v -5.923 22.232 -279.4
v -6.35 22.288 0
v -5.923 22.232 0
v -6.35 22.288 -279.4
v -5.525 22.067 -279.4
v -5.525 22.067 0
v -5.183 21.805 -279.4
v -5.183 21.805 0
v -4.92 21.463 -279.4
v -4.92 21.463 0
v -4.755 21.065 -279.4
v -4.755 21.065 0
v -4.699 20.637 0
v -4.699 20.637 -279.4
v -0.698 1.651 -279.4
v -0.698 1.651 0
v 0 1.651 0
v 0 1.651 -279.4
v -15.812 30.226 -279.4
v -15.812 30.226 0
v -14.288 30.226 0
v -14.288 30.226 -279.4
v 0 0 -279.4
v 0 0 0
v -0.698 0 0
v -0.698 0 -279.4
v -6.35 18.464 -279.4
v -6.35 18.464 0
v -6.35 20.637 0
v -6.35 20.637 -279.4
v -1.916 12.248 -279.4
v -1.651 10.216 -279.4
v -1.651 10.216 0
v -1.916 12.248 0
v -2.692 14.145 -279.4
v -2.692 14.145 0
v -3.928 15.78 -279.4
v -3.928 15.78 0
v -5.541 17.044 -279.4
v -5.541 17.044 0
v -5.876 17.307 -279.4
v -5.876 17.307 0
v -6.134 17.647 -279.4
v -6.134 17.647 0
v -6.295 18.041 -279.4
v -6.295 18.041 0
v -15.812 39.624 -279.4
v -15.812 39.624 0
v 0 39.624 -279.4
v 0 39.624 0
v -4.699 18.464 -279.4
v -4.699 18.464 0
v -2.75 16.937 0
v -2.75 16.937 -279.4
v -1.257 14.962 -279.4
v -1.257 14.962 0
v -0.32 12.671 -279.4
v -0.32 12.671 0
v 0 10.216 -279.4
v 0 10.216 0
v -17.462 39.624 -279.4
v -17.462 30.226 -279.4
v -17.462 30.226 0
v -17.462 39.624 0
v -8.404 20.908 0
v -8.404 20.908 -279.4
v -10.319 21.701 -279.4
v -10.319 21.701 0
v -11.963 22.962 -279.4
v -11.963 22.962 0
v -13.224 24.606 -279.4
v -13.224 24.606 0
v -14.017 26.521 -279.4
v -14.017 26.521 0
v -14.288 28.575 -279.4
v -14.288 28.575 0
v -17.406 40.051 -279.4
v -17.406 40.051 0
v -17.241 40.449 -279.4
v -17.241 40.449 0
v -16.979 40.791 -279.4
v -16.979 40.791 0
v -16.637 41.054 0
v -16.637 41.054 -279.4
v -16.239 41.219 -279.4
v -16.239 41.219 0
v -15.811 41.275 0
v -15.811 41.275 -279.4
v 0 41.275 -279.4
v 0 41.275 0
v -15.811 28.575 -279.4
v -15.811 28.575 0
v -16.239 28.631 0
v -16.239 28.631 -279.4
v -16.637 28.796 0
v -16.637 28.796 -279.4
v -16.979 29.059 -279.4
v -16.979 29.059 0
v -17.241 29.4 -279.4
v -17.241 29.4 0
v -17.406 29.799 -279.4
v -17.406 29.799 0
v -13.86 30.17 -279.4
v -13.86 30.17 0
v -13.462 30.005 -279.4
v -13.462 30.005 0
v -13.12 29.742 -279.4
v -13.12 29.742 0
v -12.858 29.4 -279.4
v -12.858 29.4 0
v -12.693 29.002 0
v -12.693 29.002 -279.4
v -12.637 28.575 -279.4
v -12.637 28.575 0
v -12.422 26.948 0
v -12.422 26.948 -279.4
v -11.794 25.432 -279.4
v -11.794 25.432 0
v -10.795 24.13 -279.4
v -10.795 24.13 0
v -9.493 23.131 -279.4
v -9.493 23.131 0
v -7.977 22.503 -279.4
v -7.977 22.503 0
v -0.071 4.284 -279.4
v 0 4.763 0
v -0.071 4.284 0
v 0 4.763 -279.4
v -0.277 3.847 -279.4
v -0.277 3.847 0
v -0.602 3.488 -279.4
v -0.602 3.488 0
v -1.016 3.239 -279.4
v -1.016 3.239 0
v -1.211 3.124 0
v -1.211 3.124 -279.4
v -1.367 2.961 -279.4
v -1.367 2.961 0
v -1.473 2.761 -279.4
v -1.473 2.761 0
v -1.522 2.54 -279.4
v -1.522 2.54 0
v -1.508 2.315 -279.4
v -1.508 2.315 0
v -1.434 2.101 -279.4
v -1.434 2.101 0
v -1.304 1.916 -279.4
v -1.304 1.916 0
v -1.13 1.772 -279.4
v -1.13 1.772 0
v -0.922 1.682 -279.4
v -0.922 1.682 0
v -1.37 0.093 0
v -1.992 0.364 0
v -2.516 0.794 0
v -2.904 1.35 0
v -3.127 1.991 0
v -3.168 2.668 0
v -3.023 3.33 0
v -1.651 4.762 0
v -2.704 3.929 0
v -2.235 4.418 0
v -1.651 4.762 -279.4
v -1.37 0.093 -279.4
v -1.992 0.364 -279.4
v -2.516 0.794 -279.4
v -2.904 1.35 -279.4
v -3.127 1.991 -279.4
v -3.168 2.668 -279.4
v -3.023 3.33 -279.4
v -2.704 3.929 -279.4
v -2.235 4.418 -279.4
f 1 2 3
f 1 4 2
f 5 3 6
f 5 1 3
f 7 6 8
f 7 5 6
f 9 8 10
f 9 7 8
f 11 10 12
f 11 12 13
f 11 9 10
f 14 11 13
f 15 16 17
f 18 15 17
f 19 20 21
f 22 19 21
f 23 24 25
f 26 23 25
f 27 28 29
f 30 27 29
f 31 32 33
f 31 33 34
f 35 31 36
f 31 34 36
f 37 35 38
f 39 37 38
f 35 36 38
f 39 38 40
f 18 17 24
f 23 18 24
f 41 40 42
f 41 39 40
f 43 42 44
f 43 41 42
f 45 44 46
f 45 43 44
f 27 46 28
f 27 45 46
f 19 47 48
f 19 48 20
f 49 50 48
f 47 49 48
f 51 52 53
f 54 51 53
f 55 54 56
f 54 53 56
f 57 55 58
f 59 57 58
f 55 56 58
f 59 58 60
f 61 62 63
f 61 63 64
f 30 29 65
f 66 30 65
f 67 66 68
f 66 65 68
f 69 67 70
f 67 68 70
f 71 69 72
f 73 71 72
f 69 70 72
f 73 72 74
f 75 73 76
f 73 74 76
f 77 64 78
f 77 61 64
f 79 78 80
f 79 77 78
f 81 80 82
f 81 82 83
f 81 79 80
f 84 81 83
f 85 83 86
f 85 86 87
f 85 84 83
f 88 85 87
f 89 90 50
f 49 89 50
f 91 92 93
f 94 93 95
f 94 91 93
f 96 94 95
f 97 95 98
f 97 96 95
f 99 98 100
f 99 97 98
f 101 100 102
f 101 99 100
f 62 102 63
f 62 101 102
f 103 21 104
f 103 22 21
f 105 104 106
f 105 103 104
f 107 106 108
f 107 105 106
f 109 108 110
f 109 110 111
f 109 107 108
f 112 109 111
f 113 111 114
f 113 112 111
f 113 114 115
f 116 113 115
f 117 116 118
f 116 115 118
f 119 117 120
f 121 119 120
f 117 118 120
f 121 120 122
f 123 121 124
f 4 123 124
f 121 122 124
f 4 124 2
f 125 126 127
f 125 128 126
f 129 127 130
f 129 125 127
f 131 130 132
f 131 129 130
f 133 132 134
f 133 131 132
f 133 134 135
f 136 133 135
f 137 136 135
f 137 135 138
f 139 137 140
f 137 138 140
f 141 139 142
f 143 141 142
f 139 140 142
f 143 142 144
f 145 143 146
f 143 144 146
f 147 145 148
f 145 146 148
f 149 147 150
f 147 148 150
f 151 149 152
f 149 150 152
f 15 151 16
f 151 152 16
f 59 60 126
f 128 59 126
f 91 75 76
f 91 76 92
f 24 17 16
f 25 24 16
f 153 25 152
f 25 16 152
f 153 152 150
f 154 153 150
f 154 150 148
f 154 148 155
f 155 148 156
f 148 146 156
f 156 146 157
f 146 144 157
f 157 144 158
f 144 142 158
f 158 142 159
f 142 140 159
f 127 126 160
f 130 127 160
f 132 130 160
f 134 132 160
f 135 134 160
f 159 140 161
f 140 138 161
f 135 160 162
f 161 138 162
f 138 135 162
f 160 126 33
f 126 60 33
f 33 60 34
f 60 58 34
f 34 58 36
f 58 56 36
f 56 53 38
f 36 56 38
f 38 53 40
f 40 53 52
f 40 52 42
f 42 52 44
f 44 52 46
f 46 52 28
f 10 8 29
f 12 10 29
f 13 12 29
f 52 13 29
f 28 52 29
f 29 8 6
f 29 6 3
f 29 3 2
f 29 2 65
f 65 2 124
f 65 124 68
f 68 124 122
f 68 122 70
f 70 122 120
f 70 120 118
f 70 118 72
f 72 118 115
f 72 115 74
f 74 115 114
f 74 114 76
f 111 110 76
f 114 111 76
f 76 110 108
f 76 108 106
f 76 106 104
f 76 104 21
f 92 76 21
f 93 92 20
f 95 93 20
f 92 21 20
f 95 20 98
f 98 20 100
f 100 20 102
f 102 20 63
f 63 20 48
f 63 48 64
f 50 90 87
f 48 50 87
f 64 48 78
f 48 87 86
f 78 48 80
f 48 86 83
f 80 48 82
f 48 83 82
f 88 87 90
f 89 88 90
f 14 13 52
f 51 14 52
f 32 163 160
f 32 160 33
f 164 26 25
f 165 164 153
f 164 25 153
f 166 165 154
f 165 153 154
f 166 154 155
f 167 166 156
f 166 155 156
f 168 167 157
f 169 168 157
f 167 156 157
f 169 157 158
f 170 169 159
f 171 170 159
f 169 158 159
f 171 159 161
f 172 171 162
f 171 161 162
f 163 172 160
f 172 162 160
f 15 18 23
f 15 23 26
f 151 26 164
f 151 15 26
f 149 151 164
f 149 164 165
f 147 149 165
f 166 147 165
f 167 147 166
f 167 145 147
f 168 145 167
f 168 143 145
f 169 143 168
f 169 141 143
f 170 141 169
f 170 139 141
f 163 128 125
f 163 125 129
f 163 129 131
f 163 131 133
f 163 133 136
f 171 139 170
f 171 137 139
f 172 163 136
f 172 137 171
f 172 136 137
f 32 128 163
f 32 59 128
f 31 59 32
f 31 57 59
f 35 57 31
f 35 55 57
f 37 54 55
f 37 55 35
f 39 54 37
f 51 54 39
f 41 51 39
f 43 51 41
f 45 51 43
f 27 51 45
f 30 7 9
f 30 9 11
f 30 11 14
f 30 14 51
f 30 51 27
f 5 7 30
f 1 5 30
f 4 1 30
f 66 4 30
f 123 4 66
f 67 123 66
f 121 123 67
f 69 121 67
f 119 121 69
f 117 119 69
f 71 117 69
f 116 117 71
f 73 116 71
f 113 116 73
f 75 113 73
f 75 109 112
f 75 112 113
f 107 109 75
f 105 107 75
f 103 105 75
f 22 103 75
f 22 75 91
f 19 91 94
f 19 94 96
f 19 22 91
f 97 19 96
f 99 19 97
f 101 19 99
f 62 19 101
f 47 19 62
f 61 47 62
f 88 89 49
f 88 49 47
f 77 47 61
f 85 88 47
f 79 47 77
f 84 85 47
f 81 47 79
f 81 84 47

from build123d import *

# Parameters (mm, degrees)
EXTRUDE_THIN2_DEPTH = 279.4
FILLET1_R           = 1.651


with BuildPart() as part:
    # Sketch1 → Extrude-Thin2 (new body)
    with BuildSketch(Plane.XY):
        with BuildLine():
            Line((0, 0), (-0.6985, 0))
            ThreePointArc((-0.6985, 0), (-3.126908, 1.990818), (-1.651, 4.7625))
            Line((-1.651, 4.7625), (-1.651, 10.215706))
            ThreePointArc((-1.651, 10.215706), (-2.928564, 14.534173), (-6.35, 17.4625))
            Line((-6.35, 17.4625), (-6.35, 20.6375))
            ThreePointArc((-6.35, 20.6375), (-11.96266, 22.96234), (-14.2875, 28.575))
            Line((-14.2875, 28.575), (-17.4625, 28.575))
            Line((-17.4625, 28.575), (-17.4625, 41.275))
            Line((-17.4625, 41.275), (0, 41.275))
            Line((0, 41.275), (0, 39.624))
            Line((0, 39.624), (-15.8115, 39.624))
            Line((-15.8115, 39.624), (-15.8115, 30.226))
            Line((-15.8115, 30.226), (-12.415829, 30.226))
            ThreePointArc((-12.415829, 30.226), (-10.795227, 24.129773), (-4.699, 22.509171))
            Line((-4.699, 22.509171), (-4.699, 18.463865))
            ThreePointArc((-4.699, 18.463865), (-1.257164, 14.962092), (0, 10.215706))
            Line((0, 10.215706), (0, 2.916441))
            ThreePointArc((0, 2.916441), (-1.421211, 2.875423), (-0.6985, 1.651))
            Line((-0.6985, 1.651), (0, 1.651))
            Line((0, 1.651), (0, 0))
        make_face()
    extrude(amount=-EXTRUDE_THIN2_DEPTH)

    # Fillet1
    fillet1_edges = [part.edges().sort_by_distance(p)[0] for p in [
        (-12.415829, 30.226, -139.7),
        (-4.699, 22.509171, -139.7),
        (0, 2.916441, -139.7),
        (-6.35, 17.4625, -139.7),
        (-17.4625, 28.575, -139.7),
        (-17.4625, 41.275, -139.7),
    ]]
    fillet(fillet1_edges, radius=FILLET1_R)


solid = part.part
